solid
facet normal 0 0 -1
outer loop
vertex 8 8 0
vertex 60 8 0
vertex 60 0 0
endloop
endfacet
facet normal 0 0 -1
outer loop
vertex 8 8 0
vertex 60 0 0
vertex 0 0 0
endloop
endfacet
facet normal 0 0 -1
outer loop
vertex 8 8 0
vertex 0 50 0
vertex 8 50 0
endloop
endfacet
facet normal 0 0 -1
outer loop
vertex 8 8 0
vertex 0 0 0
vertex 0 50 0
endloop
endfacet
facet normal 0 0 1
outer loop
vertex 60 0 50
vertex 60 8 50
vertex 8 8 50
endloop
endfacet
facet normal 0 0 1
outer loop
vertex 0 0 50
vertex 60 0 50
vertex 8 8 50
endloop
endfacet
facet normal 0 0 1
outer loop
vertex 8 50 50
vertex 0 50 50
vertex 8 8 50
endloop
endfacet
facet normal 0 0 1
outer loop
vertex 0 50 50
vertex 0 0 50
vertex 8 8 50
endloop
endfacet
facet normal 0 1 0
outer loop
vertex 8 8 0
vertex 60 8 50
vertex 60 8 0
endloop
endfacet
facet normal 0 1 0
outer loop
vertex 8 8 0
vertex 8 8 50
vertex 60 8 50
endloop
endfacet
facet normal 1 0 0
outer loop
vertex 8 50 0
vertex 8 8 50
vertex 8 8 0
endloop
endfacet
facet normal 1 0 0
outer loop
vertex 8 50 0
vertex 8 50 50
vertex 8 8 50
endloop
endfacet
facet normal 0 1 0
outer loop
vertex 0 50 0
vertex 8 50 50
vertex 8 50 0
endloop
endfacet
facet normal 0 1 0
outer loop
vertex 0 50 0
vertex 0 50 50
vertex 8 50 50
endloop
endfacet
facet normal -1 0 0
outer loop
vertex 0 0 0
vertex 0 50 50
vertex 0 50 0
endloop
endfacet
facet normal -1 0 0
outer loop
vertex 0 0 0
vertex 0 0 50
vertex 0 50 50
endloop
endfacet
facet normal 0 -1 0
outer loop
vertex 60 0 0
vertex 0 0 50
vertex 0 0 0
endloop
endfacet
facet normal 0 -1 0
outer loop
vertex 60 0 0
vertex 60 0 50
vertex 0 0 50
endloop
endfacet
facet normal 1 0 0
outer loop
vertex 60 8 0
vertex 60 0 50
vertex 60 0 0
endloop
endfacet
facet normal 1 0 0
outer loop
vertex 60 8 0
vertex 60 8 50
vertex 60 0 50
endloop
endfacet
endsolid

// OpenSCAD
$fn = 32;

// ----------------------------------------------------------------------
// Structural section: angle 60 x 50 mm
// ----------------------------------------------------------------------

// --- parameters (mm) ---
sec_w = 60;               // leg width, X
sec_h = 50;               // leg height, Y
flange_t = 8;             // leg thickness
plate_t = 50;             // cut length, Z (extrusion height)

profile = [[0, 0], [60, 0], [60, 8], [8, 8], [8, 50], [0, 50]];  // primary outline, 6 points, counter clockwise

// --- the one profile operation ---
linear_extrude(height = plate_t) polygon(points = profile);
